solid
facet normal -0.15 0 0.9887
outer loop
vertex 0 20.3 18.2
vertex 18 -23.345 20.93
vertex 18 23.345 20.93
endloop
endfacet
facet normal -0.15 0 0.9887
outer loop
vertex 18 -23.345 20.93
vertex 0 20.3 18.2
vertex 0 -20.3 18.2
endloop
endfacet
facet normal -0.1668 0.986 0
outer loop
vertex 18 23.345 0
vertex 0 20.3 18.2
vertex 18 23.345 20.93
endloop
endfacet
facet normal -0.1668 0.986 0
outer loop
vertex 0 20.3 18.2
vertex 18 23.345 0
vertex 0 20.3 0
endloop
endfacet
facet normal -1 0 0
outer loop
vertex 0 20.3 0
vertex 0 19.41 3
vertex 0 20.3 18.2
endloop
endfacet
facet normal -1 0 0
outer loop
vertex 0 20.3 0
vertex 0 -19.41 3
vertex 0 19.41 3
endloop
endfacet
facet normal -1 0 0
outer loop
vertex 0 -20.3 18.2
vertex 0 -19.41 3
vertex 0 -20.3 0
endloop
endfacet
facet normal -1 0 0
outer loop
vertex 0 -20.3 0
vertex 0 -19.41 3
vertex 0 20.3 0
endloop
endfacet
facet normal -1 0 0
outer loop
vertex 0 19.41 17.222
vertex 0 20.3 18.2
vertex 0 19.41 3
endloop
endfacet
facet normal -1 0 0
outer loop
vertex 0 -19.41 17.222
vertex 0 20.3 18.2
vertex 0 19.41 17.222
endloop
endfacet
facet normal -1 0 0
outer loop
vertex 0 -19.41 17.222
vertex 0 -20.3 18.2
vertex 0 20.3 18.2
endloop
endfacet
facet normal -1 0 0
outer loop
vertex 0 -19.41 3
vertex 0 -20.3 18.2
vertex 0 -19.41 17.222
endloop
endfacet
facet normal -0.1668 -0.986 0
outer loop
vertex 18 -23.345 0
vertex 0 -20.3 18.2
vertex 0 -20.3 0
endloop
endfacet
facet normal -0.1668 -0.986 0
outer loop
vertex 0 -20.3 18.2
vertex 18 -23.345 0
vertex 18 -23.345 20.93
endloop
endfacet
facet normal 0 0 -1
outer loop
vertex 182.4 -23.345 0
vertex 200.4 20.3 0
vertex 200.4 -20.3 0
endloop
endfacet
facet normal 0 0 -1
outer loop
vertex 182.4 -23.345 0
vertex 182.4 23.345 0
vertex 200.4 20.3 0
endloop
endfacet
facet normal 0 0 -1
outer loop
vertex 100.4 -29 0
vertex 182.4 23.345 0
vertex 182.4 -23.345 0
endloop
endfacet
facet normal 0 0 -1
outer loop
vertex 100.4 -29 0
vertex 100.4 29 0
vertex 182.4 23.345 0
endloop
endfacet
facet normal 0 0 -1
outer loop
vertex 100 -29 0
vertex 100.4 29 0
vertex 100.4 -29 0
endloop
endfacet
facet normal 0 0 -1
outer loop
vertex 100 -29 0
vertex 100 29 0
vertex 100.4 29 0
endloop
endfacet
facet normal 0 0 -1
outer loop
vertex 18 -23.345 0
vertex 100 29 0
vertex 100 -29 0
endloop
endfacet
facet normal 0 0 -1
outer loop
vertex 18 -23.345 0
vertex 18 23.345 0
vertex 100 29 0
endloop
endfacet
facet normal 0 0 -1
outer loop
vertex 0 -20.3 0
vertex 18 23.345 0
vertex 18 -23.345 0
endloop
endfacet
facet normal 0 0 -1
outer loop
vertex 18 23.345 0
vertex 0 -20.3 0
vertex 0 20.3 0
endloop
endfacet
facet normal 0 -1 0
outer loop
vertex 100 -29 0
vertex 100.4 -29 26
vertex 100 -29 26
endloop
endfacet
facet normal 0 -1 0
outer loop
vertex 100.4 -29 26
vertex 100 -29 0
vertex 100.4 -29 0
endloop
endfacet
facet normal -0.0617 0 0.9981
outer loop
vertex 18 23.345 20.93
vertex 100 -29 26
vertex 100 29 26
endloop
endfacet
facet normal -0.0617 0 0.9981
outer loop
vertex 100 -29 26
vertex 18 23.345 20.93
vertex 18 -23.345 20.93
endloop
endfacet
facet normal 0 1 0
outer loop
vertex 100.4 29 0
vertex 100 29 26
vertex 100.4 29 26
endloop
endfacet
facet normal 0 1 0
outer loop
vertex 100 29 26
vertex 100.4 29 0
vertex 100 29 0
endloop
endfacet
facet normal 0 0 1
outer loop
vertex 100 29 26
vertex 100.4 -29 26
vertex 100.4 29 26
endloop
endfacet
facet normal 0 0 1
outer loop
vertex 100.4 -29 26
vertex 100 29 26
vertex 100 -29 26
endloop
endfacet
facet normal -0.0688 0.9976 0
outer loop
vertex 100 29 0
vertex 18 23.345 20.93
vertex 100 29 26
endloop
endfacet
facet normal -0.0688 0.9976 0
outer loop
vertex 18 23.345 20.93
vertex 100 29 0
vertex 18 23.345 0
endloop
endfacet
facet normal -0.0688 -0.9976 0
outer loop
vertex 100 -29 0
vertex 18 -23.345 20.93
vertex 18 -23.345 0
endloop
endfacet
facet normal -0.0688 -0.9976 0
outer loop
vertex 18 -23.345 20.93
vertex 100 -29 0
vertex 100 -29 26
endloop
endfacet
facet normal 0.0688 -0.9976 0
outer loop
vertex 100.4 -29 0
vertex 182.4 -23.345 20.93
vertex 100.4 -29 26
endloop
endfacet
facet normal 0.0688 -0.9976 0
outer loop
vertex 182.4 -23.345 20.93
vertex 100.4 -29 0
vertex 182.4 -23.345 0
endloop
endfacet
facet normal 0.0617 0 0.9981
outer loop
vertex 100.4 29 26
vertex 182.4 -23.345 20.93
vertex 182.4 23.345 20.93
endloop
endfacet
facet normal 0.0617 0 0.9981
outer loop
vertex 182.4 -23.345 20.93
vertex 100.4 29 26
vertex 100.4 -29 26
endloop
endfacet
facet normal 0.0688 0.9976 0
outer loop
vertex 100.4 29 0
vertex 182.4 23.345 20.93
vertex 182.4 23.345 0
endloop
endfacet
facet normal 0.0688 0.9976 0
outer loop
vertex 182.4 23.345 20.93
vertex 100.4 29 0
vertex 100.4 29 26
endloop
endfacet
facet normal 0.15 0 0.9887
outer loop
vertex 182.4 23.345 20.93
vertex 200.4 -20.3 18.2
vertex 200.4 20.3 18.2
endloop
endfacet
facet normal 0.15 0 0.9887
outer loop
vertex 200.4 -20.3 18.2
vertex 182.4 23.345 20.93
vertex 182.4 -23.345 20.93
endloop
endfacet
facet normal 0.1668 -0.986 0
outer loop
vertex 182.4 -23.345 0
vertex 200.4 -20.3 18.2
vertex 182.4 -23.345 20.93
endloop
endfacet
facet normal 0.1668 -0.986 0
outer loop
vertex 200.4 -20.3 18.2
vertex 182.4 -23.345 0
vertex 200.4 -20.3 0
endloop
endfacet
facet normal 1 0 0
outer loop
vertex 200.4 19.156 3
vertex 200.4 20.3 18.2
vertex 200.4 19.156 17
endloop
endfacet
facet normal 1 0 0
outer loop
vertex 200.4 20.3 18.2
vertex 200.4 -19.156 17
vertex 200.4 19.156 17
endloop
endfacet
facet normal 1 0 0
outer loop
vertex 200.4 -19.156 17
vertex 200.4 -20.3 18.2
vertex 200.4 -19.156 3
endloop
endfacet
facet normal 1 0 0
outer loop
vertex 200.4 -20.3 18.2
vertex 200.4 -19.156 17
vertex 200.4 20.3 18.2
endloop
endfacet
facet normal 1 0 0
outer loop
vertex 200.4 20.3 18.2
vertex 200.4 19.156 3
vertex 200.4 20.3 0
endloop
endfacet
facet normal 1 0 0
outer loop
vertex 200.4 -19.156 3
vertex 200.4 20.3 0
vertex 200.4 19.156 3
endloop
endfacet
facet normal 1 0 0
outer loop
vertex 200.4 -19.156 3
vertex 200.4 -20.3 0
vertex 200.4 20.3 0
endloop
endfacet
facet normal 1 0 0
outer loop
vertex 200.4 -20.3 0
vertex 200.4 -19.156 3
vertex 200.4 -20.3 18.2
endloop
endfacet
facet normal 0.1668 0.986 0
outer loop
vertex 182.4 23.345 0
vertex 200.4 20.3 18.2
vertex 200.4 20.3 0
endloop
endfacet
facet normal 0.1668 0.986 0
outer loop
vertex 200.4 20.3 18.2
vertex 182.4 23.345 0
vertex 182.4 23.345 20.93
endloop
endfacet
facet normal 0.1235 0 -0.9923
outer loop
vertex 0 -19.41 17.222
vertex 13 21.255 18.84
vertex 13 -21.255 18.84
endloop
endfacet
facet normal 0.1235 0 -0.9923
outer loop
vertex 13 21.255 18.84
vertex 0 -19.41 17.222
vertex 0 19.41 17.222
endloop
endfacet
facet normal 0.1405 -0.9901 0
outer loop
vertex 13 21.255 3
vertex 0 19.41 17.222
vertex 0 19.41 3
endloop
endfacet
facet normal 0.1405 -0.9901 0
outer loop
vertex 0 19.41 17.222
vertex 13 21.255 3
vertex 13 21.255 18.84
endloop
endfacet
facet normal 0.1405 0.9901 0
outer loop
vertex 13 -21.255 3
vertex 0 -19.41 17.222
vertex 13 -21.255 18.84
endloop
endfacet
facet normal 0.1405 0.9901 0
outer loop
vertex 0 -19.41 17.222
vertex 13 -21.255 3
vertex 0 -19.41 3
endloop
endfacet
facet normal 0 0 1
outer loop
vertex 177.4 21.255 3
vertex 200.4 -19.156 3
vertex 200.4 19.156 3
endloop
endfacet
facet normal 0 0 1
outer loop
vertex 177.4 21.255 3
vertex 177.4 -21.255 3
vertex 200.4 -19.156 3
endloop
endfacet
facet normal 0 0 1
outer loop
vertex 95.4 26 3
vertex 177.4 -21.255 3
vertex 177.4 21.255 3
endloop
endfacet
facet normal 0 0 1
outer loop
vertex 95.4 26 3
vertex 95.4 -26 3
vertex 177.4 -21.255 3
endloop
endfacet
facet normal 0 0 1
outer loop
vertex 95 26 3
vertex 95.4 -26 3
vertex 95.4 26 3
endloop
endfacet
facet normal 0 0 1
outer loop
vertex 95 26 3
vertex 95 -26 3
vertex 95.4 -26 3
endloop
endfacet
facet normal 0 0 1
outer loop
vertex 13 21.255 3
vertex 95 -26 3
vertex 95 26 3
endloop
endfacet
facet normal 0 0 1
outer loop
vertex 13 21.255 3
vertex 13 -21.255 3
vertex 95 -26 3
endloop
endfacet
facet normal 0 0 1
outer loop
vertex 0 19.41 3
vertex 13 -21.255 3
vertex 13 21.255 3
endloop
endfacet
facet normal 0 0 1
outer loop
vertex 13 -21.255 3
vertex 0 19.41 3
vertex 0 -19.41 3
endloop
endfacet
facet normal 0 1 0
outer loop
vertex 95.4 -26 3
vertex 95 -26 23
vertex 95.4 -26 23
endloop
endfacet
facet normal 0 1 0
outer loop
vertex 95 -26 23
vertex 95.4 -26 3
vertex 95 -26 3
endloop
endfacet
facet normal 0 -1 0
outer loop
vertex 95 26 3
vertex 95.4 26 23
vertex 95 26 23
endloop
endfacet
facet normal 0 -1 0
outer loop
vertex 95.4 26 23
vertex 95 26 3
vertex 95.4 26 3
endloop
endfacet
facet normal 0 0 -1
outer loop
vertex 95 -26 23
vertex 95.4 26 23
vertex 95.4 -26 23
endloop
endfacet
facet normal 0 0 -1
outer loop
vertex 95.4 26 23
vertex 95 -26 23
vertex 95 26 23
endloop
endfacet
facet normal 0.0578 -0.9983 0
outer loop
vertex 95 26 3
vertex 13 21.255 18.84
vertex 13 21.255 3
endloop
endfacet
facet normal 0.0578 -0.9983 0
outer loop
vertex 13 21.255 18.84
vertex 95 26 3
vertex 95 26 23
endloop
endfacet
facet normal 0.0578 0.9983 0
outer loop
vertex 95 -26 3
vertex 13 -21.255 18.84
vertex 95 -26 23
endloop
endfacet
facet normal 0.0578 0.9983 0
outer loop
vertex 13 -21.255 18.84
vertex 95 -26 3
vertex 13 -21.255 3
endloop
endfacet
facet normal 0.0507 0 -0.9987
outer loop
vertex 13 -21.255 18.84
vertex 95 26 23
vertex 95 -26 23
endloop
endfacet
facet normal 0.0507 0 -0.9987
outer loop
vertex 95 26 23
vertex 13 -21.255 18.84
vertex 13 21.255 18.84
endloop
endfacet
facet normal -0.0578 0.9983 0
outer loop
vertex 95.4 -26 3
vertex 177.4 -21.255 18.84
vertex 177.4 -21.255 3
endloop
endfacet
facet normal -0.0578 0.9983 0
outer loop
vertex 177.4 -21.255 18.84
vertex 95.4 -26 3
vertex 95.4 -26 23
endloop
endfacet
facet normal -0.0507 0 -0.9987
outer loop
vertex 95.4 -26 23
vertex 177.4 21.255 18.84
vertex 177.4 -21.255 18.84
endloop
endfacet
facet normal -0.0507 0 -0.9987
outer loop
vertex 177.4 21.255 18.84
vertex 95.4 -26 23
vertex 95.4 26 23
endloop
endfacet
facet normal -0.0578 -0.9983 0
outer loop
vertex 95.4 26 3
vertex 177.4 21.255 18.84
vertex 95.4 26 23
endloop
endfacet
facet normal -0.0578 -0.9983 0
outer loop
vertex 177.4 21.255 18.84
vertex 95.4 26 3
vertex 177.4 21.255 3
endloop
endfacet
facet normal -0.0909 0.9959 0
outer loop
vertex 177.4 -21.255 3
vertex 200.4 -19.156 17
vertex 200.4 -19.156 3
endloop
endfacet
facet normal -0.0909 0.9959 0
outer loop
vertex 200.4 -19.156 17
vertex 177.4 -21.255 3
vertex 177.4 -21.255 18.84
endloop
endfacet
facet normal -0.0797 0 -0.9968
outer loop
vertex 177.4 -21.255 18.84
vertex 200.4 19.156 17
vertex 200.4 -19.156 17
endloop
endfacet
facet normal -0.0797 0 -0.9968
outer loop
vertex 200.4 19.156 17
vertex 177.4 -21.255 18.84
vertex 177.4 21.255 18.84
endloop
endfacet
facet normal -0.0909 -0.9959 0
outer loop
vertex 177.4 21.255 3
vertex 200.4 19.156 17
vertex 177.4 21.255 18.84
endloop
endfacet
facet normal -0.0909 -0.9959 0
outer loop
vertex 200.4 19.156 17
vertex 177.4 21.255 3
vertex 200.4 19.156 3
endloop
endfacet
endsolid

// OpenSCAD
$fn = 32;

// ----------------------------------------------------------------------
// Faired channel: 200 x 58 x 26 mm, 3 mm walls, faired ends
// ----------------------------------------------------------------------

// --- parameters (mm) ---
length = 200;             // channel length
width = 58;               // channel width at mid length
height = 26;              // channel height at mid length
wall = 3;                 // side wall thickness
floor_t = 3;              // floor thickness
end_w = 40.6;             // faired end width
end_h = 18.2;             // faired end height

difference() {
  union() {
    hull() {
      translate([0, -20.3, 0]) cube([0.4, 40.6, 18.2]);
      translate([18, -23.345, 0]) cube([0.4, 46.69, 20.93]);
    }
    hull() {
      translate([18, -23.345, 0]) cube([0.4, 46.69, 20.93]);
      translate([100, -29, 0]) cube([0.4, 58, 26]);
    }
    hull() {
      translate([100, -29, 0]) cube([0.4, 58, 26]);
      translate([182, -23.345, 0]) cube([0.4, 46.69, 20.93]);
    }
    hull() {
      translate([182, -23.345, 0]) cube([0.4, 46.69, 20.93]);
      translate([200, -20.3, 0]) cube([0.4, 40.6, 18.2]);
    }
  }
  /* cavity, 5 mm proud of both ends so the ports are cut clean */
  hull() {
    translate([-5, -18.7, 3]) cube([0.4, 37.4, 13.6]);
    translate([13, -21.255, 3]) cube([0.4, 42.51, 15.84]);
  }
  hull() {
    translate([13, -21.255, 3]) cube([0.4, 42.51, 15.84]);
    translate([95, -26, 3]) cube([0.4, 52, 20]);
  }
  hull() {
    translate([95, -26, 3]) cube([0.4, 52, 20]);
    translate([177, -21.255, 3]) cube([0.4, 42.51, 15.84]);
  }
  hull() {
    translate([177, -21.255, 3]) cube([0.4, 42.51, 15.84]);
    translate([205, -18.7, 3]) cube([0.4, 37.4, 13.6]);
  }
}
